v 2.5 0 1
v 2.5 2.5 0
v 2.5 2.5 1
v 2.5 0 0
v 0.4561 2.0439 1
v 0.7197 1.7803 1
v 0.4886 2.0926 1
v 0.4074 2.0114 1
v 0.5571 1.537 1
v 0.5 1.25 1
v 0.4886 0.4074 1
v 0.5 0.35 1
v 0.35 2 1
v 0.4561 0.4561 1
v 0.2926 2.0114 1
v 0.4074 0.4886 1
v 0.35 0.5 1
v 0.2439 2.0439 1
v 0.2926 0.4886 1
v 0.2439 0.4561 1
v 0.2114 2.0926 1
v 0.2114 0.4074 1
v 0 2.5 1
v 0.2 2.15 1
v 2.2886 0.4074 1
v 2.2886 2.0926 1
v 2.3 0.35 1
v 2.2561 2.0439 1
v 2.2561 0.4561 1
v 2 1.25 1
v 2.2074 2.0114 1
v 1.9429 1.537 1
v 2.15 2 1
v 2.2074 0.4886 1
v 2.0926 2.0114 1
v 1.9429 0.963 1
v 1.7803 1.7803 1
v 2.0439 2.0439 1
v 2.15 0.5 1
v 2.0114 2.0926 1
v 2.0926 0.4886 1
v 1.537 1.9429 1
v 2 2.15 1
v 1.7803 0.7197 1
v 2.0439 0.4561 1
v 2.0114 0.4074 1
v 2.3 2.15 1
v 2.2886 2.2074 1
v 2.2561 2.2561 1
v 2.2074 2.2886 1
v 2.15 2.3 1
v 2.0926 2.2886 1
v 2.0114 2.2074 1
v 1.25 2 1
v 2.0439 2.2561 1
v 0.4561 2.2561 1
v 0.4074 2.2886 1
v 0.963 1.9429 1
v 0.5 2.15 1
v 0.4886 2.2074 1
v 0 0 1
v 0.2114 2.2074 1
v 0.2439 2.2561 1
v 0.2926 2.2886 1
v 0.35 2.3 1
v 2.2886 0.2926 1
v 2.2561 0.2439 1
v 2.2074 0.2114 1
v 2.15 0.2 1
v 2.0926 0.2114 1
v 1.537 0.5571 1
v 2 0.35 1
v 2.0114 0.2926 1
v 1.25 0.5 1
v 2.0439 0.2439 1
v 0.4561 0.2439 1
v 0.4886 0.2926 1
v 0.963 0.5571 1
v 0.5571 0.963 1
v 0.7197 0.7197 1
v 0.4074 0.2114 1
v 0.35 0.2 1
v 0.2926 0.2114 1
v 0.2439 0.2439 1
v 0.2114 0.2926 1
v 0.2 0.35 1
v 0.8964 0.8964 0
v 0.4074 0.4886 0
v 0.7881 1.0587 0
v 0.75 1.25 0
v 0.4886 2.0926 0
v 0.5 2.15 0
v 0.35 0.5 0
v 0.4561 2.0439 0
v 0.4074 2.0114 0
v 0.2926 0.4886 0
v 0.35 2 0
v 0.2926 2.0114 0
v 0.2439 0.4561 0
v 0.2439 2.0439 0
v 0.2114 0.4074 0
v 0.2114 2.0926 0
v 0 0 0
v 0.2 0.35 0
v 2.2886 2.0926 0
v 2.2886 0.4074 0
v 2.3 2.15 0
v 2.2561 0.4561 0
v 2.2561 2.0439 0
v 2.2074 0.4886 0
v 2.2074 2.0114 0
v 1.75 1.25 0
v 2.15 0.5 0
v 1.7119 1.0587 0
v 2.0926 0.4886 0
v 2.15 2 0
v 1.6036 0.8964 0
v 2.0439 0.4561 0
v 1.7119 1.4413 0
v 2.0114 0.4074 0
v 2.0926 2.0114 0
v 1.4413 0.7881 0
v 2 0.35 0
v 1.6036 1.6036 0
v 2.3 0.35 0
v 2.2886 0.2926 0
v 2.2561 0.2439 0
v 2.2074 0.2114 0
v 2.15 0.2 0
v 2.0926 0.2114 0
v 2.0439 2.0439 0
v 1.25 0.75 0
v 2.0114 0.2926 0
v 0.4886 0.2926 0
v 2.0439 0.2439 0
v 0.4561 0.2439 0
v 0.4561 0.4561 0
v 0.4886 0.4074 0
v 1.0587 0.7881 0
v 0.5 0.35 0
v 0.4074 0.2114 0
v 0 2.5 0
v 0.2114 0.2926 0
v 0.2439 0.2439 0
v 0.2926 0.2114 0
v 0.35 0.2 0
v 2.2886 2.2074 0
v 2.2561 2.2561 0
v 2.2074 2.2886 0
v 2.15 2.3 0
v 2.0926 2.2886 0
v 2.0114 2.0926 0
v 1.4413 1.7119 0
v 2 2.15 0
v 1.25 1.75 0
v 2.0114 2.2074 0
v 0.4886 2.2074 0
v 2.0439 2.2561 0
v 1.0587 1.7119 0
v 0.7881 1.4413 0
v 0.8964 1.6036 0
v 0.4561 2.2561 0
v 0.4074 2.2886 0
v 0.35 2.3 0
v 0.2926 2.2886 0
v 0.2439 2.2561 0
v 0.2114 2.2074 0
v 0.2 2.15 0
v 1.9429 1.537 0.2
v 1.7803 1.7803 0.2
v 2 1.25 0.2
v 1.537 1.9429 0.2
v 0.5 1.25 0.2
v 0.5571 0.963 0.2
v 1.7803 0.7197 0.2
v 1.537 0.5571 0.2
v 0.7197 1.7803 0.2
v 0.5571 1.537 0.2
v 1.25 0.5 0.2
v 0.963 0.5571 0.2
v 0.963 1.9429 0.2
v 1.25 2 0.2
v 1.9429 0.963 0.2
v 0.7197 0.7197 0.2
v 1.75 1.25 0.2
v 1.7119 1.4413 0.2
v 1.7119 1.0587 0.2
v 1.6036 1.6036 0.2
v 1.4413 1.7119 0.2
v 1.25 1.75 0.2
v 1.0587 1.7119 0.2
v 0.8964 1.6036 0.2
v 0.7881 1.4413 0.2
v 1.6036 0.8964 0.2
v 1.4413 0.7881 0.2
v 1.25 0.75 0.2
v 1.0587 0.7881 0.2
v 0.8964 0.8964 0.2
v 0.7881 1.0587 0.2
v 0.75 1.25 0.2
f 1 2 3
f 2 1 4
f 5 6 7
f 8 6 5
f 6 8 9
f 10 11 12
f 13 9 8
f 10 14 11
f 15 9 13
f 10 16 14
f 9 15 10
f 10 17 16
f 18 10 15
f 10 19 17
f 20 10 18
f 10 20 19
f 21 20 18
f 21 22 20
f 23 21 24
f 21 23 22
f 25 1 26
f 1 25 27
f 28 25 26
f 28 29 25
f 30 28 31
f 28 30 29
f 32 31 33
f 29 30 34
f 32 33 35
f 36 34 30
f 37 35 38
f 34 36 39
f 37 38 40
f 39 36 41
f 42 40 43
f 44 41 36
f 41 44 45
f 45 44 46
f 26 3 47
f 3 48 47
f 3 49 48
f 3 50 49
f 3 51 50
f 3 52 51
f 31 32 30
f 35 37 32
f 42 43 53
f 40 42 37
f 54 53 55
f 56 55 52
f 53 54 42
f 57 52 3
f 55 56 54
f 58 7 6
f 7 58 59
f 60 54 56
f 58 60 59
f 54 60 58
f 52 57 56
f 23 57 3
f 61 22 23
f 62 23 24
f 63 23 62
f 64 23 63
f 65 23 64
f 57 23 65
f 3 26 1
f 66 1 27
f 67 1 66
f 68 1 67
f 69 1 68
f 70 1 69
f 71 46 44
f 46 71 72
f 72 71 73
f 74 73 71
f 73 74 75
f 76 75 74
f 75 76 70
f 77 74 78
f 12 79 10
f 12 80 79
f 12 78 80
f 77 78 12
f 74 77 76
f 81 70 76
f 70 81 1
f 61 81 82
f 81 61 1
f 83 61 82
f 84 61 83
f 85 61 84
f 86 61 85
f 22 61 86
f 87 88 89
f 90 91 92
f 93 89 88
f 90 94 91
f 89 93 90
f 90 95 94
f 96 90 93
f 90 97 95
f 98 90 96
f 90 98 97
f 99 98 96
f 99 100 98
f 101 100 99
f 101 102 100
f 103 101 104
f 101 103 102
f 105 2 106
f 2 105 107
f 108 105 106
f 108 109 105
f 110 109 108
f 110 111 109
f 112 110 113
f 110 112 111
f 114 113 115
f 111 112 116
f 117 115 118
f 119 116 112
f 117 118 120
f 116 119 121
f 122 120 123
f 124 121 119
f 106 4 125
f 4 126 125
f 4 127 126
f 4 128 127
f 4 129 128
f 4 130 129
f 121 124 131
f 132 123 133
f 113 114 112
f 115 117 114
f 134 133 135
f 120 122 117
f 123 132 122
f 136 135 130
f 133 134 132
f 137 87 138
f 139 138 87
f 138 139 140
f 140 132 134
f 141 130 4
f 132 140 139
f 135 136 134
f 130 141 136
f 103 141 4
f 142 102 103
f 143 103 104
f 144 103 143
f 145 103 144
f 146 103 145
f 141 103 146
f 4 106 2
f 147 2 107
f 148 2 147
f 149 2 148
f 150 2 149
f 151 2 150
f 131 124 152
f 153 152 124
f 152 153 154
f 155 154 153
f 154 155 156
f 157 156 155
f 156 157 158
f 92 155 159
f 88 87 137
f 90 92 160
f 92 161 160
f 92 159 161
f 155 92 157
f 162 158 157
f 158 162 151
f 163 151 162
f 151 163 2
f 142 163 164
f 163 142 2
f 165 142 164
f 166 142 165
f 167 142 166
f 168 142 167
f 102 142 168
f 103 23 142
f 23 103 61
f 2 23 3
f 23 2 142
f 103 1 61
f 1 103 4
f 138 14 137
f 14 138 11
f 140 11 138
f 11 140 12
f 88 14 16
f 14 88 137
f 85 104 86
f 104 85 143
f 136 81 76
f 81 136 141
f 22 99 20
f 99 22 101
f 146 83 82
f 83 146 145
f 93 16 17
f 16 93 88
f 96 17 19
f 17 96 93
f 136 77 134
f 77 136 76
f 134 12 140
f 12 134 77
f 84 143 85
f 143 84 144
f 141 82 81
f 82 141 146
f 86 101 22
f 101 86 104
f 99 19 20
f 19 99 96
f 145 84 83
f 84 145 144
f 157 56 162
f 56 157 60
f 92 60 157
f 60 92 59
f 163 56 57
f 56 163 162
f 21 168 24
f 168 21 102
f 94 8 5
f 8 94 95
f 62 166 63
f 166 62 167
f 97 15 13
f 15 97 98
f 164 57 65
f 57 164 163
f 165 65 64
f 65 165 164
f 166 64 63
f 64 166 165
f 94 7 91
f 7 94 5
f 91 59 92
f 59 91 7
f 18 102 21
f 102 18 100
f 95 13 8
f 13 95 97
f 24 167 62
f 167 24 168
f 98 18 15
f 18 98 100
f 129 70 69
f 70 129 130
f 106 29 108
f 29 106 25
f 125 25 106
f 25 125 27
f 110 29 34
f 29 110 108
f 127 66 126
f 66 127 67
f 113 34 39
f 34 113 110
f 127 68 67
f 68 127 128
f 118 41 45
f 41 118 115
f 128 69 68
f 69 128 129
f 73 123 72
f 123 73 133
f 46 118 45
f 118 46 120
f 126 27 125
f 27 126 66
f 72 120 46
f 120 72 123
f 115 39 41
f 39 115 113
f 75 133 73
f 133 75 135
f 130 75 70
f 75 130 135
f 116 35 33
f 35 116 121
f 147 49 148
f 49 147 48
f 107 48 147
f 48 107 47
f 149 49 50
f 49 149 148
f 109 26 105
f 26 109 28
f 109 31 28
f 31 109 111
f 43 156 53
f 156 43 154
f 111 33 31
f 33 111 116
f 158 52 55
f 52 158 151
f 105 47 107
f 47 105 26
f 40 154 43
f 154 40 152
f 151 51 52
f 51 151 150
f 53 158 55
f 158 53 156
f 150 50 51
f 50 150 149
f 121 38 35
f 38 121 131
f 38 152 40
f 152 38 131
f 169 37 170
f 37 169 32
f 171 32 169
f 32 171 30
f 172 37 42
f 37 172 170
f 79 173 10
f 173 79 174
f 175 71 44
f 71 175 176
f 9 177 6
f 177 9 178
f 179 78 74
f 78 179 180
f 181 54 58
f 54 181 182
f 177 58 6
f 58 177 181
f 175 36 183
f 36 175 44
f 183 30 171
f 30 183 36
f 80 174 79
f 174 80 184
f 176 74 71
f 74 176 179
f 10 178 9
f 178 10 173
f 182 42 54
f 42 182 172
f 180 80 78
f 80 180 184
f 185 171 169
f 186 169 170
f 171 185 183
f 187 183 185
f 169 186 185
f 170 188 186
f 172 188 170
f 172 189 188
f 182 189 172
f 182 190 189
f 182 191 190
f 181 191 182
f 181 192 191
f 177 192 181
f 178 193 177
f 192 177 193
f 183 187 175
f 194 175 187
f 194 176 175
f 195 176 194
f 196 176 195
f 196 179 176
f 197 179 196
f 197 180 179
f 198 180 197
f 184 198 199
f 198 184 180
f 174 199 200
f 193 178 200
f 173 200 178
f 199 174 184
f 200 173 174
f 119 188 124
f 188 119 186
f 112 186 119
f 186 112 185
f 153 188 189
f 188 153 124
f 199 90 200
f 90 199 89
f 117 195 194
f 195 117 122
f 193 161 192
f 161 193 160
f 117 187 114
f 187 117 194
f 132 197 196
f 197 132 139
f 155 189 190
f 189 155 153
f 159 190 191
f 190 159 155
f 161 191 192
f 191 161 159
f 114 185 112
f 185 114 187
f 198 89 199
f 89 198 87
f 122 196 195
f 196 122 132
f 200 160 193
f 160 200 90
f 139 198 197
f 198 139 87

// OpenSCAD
$fa = 1;
$fs = 0.4;
$fn = 16;

module blocchetto_laser() {
    difference() {
        cube([2.5, 2.5, 1]);    
        
        translate([0.35, 0.35, 0])
            cylinder(3, 0.15, 0.15, center = true);
        translate([0.35, 2.15, 0])
            cylinder(3, 0.15, 0.15, center = true);
        translate([2.15, 0.35, 0])
            cylinder(3, 0.15, 0.15, center = true);
        translate([2.15, 2.15, 0])
            cylinder(3, 0.15, 0.15, center = true);
        translate([1.25, 1.25, 0.2])
            cylinder(3, 0.75, 0.75);
        translate([1.25, 1.25, -0.1])
            cylinder(3, 0.5, 0.5);
    }
}

blocchetto_laser();
